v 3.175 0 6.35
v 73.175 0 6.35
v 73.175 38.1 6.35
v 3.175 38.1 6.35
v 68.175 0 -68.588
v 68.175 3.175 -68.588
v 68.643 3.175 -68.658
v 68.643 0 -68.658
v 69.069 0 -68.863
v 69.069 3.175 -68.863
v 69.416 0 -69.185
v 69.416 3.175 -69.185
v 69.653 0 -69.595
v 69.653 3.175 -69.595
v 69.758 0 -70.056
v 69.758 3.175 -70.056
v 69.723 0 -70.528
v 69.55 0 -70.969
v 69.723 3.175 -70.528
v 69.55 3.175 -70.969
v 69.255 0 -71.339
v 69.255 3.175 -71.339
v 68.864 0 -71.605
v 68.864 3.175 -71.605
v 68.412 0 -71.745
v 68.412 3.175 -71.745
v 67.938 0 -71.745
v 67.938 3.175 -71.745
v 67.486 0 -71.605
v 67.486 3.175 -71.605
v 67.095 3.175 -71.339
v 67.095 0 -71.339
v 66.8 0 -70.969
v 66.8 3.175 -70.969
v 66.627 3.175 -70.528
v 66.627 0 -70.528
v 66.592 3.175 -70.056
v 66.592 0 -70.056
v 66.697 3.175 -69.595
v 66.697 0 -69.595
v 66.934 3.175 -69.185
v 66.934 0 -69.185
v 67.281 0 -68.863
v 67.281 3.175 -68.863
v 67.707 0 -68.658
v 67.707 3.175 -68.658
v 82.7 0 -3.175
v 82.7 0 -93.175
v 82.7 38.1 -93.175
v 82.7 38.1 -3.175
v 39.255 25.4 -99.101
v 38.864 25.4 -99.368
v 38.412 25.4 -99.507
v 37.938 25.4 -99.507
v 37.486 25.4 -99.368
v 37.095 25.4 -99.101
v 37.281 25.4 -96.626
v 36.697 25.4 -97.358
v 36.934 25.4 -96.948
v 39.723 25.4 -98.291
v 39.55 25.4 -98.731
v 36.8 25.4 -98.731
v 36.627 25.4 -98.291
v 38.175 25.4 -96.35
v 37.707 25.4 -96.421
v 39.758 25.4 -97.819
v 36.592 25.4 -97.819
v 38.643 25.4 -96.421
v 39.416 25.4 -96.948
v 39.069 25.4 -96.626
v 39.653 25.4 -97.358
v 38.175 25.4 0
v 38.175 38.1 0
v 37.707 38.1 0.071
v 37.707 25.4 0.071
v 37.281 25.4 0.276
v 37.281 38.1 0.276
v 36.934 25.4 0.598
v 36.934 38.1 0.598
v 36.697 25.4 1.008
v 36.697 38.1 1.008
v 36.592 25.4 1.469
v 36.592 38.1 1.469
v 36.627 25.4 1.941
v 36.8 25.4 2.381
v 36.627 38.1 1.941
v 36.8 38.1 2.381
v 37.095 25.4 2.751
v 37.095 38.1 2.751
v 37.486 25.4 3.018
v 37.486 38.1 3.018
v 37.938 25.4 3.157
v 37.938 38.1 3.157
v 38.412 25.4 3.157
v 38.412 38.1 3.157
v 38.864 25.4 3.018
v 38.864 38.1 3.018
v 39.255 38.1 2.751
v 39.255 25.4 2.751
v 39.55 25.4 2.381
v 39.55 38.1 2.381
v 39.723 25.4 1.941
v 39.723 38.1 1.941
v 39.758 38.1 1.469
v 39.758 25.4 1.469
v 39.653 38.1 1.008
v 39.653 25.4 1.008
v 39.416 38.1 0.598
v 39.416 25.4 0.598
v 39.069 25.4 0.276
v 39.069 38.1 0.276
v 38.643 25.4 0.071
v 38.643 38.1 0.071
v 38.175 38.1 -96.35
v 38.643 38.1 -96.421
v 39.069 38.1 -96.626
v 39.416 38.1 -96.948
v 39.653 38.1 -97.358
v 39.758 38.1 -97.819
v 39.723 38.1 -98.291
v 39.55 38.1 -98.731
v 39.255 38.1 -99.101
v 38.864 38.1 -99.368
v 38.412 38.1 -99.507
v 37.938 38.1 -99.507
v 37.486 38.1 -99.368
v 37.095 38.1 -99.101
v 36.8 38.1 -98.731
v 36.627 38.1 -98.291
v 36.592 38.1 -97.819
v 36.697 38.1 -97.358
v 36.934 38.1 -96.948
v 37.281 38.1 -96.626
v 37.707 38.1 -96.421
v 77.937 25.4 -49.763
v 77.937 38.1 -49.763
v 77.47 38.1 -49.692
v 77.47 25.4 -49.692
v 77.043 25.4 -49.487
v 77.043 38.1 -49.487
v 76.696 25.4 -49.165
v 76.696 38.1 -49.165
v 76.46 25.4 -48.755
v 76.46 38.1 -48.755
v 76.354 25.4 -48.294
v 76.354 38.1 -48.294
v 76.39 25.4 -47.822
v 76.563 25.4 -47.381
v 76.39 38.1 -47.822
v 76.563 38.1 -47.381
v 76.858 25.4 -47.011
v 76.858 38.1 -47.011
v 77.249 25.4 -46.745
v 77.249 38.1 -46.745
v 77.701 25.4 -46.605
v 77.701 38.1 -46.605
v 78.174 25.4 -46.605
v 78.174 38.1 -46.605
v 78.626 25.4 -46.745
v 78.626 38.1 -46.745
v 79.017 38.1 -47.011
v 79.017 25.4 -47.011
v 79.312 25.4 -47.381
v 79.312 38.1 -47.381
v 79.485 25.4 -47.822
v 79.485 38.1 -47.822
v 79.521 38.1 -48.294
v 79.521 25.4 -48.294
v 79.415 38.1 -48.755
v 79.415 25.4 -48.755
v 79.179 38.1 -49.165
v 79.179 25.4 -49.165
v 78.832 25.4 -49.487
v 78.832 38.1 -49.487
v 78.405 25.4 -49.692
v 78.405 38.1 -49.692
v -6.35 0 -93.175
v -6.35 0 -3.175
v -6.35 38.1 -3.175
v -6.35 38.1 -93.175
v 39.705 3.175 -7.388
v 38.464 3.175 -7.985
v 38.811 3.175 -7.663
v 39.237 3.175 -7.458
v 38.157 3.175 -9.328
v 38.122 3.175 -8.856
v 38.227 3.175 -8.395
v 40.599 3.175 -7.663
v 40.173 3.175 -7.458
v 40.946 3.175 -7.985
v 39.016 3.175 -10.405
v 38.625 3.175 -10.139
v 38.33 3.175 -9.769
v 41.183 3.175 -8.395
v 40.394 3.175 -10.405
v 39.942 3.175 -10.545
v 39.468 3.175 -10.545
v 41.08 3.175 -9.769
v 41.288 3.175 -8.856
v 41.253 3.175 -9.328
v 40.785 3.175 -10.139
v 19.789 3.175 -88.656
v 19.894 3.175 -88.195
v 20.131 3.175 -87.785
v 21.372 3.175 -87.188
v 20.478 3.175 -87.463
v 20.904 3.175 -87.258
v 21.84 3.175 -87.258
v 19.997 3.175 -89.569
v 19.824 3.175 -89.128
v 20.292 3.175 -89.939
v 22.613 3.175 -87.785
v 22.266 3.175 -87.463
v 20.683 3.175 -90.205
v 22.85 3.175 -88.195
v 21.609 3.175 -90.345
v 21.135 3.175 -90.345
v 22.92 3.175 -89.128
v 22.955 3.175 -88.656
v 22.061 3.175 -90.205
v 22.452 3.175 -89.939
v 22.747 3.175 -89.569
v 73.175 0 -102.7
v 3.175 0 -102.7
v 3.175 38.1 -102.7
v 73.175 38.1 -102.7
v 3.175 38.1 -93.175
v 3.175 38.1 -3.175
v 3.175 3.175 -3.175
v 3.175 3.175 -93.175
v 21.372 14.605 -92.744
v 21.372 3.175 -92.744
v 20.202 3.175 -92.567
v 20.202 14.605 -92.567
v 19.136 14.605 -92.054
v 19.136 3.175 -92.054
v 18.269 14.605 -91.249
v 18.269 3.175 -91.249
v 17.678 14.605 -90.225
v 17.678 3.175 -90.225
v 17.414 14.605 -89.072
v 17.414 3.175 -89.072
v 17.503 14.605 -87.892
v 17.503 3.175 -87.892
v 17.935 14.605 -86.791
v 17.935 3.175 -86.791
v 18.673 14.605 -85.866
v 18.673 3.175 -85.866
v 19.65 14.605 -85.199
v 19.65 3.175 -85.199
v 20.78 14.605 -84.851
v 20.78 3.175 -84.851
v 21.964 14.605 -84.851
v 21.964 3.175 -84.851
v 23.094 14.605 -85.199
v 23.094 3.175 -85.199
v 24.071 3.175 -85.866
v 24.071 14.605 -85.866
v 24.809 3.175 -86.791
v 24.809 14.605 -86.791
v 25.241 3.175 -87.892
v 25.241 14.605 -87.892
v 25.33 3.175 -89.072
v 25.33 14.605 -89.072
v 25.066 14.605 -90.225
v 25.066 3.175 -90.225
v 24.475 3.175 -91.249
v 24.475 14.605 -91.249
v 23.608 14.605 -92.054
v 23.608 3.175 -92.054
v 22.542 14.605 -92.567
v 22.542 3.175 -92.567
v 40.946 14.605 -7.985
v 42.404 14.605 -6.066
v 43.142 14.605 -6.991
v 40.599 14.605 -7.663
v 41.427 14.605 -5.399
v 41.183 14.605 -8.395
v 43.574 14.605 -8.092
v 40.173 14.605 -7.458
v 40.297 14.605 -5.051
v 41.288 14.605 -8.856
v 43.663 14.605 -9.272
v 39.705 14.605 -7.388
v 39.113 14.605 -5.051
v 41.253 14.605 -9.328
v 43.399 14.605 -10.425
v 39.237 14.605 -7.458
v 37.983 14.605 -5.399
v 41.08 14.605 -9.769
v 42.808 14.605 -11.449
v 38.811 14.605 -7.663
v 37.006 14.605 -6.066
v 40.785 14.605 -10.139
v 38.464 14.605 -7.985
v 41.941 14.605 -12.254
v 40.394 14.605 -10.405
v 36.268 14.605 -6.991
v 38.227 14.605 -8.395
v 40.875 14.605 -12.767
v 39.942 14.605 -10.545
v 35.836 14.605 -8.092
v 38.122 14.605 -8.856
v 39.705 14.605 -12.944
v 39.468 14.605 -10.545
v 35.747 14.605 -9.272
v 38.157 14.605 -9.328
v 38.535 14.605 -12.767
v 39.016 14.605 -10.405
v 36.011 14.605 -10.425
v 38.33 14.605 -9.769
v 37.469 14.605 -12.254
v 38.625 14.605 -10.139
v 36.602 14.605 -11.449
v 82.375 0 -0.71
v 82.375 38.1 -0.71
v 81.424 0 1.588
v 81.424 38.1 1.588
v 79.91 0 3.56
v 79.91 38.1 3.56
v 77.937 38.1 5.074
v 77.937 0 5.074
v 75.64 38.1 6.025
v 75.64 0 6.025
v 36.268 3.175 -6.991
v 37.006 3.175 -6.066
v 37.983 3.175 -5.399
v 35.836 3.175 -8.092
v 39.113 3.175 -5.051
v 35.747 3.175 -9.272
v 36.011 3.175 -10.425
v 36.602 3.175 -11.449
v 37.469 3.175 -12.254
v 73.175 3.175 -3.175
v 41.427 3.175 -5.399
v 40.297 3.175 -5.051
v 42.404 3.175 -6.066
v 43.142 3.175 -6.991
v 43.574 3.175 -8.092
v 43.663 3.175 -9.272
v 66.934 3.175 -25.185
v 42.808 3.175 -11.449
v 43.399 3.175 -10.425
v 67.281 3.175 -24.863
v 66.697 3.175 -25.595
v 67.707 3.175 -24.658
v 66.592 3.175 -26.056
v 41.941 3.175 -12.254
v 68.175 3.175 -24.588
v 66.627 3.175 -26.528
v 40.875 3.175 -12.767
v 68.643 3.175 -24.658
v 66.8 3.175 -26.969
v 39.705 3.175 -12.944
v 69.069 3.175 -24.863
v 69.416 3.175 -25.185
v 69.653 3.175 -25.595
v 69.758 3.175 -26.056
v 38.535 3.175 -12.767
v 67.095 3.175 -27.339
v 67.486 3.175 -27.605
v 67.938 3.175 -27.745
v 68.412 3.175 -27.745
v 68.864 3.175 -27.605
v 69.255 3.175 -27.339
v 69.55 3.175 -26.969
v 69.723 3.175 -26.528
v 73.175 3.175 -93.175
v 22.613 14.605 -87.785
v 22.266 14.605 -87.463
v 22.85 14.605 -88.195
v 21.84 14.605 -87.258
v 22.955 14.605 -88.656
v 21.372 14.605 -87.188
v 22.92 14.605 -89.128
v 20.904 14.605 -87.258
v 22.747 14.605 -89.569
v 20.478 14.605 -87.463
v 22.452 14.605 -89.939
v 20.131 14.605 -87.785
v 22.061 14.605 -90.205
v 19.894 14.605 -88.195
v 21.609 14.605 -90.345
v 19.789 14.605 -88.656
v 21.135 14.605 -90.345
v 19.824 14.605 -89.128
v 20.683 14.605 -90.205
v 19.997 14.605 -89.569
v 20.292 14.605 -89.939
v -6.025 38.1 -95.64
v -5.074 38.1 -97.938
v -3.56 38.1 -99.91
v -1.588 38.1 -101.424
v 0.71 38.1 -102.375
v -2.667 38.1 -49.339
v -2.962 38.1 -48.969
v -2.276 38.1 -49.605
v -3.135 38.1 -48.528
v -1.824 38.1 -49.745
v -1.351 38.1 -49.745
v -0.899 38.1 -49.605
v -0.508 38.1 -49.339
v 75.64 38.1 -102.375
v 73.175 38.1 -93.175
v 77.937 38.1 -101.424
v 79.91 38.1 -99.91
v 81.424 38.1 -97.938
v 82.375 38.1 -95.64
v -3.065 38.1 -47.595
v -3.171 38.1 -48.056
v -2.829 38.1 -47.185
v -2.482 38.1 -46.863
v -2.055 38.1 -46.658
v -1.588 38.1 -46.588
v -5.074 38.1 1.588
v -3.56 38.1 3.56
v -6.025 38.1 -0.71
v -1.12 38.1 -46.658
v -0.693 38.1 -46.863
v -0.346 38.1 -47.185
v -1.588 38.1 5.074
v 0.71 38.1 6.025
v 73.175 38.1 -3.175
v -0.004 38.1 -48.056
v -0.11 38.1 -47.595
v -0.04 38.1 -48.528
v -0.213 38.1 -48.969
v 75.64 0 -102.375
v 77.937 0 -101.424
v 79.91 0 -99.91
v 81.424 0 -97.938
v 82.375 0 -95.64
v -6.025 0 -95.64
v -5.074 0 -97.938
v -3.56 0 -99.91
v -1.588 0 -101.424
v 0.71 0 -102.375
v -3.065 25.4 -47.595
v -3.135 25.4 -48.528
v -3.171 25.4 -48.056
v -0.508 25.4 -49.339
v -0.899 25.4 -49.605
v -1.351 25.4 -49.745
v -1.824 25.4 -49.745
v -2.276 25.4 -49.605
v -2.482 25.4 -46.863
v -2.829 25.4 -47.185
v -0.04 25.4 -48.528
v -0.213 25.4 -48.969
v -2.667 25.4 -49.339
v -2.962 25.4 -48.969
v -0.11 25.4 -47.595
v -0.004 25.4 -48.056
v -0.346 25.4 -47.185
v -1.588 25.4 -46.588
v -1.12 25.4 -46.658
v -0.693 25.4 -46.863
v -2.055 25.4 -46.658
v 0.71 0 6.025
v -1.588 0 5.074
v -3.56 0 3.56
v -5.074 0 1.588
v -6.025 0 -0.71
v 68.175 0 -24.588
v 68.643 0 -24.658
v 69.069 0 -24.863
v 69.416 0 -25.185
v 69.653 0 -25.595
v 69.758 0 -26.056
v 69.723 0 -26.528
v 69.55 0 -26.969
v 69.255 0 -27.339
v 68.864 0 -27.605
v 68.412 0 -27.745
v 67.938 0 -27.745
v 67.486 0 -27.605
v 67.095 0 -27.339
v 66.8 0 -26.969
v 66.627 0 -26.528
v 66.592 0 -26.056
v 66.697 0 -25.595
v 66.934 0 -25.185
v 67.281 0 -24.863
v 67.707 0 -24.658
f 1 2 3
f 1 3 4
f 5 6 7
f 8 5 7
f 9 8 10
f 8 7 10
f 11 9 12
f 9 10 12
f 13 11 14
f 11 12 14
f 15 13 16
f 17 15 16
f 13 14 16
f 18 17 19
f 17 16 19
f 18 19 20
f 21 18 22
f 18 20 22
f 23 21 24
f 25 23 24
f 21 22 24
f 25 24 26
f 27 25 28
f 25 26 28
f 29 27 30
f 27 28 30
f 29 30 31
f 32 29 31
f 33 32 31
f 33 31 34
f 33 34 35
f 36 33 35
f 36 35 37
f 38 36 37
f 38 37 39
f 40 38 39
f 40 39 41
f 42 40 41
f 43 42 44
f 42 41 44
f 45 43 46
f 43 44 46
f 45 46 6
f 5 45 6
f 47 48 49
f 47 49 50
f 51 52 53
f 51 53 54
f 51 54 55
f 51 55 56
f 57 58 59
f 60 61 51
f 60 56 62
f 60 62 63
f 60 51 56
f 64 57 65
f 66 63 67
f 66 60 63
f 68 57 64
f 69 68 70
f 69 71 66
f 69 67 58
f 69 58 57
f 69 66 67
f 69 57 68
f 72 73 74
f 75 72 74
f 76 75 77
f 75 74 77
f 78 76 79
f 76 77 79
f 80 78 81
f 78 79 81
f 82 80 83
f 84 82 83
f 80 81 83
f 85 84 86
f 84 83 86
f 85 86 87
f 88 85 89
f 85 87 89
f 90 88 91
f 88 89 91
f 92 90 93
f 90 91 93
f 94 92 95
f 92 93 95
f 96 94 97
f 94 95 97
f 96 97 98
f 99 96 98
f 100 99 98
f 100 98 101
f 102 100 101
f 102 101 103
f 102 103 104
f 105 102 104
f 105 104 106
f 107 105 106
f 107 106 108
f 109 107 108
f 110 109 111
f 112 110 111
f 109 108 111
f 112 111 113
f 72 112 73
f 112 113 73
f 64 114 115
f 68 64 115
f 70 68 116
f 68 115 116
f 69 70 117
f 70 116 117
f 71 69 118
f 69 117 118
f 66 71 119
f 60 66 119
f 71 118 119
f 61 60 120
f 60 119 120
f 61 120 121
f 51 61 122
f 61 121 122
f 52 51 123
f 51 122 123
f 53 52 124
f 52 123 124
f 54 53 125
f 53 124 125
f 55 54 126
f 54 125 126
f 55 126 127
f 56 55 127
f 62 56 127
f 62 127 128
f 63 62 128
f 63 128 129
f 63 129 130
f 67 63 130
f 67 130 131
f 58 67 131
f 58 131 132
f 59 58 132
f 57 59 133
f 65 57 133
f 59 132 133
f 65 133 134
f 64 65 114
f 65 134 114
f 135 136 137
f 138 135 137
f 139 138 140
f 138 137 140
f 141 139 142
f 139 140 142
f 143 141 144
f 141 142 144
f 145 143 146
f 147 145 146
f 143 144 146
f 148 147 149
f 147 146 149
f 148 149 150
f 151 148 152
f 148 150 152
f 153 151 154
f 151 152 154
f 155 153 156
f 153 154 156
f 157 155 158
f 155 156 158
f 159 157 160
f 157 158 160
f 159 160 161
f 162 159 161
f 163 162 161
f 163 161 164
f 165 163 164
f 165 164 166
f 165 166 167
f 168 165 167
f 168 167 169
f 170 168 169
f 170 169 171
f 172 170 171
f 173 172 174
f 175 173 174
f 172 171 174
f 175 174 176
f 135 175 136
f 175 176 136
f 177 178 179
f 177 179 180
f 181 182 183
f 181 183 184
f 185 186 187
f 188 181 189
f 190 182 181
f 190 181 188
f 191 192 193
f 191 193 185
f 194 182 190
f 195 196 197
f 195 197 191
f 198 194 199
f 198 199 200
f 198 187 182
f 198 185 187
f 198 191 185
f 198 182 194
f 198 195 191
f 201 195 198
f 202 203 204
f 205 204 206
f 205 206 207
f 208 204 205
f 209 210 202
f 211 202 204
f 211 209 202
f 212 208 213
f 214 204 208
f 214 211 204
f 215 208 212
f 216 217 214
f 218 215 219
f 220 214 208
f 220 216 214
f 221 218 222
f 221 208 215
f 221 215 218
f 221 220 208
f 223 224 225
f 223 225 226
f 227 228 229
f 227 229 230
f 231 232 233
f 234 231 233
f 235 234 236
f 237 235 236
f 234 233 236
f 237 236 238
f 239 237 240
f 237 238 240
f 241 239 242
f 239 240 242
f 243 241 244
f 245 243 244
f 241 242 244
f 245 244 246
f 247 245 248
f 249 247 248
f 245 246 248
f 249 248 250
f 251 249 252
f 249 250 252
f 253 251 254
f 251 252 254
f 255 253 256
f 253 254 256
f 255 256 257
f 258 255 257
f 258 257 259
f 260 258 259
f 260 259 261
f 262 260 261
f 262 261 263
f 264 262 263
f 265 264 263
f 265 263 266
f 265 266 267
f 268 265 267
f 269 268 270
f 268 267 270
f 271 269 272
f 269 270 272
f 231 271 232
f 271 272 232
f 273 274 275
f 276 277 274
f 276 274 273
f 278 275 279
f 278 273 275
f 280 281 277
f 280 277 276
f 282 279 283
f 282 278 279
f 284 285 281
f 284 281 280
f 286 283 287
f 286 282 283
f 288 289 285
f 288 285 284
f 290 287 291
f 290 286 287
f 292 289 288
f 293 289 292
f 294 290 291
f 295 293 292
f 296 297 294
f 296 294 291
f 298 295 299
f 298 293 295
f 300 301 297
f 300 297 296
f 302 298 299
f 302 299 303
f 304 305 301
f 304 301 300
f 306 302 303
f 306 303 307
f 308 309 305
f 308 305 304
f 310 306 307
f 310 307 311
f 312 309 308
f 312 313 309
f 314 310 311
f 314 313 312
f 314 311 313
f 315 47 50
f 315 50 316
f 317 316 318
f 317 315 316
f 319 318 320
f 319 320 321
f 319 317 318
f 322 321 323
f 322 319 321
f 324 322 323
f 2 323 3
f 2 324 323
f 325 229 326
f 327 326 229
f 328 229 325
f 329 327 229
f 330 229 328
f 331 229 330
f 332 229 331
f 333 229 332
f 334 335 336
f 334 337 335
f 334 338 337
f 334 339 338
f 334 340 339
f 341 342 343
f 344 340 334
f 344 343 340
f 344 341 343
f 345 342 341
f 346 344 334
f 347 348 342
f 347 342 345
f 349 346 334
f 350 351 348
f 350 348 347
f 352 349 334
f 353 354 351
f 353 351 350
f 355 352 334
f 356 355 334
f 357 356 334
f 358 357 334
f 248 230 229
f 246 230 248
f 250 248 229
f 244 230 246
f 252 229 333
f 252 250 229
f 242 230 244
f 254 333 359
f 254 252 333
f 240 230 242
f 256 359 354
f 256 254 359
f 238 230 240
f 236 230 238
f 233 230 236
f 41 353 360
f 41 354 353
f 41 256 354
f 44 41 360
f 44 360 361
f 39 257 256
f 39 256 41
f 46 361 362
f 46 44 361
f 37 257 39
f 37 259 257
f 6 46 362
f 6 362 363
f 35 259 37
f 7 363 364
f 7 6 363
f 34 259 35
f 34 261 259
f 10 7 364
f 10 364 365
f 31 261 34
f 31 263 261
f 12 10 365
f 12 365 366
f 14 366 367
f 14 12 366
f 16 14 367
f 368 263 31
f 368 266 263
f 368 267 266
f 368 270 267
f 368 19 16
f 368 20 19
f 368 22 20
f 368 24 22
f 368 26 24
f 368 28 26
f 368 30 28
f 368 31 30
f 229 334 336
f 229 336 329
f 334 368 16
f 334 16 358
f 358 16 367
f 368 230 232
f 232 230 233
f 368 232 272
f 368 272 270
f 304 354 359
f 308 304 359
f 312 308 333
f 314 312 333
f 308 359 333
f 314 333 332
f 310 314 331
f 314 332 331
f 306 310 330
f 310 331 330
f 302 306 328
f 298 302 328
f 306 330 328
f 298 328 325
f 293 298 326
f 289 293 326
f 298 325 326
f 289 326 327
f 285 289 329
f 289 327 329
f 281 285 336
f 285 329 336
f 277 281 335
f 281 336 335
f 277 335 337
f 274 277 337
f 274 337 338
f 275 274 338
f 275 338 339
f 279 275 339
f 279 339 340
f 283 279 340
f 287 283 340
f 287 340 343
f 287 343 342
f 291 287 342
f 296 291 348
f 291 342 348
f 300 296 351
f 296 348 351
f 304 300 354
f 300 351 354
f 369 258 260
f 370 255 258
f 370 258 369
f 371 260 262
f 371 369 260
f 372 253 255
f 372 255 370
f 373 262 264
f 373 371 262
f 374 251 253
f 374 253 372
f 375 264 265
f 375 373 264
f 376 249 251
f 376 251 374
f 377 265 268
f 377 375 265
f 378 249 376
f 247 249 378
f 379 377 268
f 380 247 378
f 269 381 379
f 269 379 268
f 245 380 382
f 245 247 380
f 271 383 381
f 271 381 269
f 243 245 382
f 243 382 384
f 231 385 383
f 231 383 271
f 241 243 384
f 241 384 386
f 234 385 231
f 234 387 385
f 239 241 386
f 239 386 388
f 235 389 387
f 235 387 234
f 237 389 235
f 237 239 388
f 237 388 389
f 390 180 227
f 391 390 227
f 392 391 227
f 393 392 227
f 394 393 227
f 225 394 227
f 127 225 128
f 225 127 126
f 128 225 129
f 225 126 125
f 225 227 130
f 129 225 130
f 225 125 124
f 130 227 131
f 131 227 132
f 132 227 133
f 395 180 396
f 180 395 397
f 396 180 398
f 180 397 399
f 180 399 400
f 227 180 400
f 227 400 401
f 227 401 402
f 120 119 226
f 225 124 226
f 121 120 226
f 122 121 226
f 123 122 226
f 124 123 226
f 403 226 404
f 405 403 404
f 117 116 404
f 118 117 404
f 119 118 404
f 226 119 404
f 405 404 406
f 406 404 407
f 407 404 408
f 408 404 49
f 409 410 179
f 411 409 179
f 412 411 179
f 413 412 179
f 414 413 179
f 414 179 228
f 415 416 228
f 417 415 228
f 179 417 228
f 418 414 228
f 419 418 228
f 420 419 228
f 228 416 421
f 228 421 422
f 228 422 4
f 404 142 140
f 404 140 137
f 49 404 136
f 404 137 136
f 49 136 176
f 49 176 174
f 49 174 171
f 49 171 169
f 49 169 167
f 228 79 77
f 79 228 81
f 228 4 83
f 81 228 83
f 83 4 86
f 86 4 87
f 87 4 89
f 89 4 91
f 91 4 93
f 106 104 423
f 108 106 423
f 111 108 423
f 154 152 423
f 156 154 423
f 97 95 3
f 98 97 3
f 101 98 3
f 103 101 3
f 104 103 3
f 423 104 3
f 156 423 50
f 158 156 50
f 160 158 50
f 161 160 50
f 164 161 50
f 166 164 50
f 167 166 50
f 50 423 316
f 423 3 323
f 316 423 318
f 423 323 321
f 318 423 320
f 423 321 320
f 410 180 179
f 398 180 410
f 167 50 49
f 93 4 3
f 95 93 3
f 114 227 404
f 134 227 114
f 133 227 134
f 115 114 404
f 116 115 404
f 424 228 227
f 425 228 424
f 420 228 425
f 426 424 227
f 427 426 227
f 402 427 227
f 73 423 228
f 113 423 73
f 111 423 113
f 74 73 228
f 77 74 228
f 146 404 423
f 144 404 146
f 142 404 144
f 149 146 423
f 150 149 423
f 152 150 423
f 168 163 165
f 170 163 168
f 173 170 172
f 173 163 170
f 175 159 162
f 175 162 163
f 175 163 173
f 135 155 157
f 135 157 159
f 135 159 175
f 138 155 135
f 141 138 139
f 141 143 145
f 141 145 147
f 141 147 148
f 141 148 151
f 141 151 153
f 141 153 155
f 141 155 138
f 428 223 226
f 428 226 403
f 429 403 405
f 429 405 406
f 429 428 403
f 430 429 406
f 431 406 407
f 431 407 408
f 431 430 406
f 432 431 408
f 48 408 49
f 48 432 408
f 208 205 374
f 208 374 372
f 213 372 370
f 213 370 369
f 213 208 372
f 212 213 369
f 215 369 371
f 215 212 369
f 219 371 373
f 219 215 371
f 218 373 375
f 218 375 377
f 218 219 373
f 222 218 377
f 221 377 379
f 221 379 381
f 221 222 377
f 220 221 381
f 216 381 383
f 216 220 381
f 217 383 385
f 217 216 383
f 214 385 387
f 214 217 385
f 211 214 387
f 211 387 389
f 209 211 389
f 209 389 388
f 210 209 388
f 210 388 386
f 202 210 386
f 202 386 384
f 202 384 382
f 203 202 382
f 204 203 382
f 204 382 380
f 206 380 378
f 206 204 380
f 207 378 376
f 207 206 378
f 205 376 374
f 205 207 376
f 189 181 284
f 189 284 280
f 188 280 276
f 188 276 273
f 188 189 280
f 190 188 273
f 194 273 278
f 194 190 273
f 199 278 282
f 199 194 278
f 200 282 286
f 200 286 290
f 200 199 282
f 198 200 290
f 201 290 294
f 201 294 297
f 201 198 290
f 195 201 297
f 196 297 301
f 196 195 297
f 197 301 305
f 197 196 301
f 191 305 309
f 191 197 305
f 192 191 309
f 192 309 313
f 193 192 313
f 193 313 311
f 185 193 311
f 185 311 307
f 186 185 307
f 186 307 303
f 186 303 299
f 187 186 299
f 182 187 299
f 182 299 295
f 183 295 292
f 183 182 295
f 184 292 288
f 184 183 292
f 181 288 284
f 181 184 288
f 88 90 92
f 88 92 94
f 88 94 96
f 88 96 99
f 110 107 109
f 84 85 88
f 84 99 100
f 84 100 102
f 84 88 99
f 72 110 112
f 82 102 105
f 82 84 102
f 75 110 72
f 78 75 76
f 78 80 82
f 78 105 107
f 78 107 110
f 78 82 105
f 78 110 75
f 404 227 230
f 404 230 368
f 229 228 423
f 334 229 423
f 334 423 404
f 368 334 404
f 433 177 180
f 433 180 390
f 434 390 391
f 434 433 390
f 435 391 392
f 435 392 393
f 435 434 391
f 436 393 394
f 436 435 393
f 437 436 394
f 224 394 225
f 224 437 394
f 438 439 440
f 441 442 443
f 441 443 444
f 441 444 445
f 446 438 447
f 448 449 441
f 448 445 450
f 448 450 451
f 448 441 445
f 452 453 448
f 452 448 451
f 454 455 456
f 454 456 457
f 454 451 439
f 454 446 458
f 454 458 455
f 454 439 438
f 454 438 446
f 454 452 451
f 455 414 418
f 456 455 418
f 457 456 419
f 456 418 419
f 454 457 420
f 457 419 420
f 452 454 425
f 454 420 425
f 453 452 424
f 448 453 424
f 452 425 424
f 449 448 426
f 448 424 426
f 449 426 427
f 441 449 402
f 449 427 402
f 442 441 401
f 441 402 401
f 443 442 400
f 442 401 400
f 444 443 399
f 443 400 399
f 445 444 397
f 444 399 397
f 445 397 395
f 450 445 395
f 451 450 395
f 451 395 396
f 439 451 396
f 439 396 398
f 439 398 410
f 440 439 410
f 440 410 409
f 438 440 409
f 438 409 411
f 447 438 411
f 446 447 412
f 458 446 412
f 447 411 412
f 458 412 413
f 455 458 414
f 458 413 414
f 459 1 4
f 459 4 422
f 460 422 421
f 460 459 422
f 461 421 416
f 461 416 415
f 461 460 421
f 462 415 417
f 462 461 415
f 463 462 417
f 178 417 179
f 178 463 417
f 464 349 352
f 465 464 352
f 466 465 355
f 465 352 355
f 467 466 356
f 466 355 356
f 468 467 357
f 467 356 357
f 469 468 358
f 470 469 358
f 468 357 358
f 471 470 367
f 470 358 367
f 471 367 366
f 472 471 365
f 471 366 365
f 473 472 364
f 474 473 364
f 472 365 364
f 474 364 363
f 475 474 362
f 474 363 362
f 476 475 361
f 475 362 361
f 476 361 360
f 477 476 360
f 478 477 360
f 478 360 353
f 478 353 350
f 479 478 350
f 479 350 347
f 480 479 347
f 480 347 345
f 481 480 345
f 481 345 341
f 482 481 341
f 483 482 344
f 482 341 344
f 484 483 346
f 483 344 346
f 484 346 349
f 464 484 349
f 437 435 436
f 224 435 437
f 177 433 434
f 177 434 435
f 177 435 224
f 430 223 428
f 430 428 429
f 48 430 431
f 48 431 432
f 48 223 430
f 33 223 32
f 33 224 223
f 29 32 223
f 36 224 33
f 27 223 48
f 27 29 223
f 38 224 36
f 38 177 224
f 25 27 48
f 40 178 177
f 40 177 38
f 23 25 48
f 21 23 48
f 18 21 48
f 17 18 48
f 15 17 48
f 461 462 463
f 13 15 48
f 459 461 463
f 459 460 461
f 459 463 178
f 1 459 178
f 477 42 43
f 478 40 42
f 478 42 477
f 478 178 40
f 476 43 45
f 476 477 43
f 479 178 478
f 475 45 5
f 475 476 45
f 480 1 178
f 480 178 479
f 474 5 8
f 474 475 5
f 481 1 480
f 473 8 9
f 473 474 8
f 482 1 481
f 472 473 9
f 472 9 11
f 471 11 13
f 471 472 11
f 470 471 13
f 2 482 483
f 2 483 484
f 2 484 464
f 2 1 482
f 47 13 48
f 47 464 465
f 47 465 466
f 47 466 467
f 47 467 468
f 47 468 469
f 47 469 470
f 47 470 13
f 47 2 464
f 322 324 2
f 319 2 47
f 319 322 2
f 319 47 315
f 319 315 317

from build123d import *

# Parameters (mm, degrees)
BOSS_EXTRUDE1_DEPTH = 38.1
SKETCH2_W           = 69.999999954
SKETCH2_H           = 90.000000086
CUT_EXTRUDE1_DEPTH  = 34.925
SKETCH3_R           = 3.96875
SKETCH3_R_2         = 1.5875
BOSS_EXTRUDE2_DEPTH = 11.43
BOSS_EXTRUDE3_DEPTH = 38.1
SKETCH5_R           = 1.5875
CUT_EXTRUDE2_DEPTH  = 12.7
SKETCH7_R           = 1.5875
CUT_EXTRUDE3_DEPTH  = 3.175


with BuildPart() as part:
    # Sketch1 → Boss-Extrude1 (new body)
    with BuildSketch(Plane(origin=(0, 0, 0), x_dir=(1, 0, 0), z_dir=(0, 1, 0))):
        with BuildLine():
            Line((3.175, 0), (73.174999954, 0))
            ThreePointArc((73.174999954, 0), (75.420063984, 0.92993597), (76.349999954, 3.175))
            Line((76.349999954, 3.175), (76.349999954, 93.175000086))
            ThreePointArc((76.349999954, 93.175000086), (75.420063984, 95.420064116), (73.174999954, 96.350000086))
            Line((73.174999954, 96.350000086), (3.175, 96.350000086))
            ThreePointArc((3.175, 96.350000086), (0.92993597, 95.420064116), (0, 93.175000086))
            Line((0, 93.175000086), (0, 3.175))
            ThreePointArc((0, 3.175), (0.92993597, 0.92993597), (3.175, 0))
        make_face()
    extrude(amount=BOSS_EXTRUDE1_DEPTH)

    # Sketch2 → Cut-Extrude1 (cut)
    with BuildSketch(Plane(origin=(0, 38.1, 0), x_dir=(1, 0, 0), z_dir=(0, 1, 0))):
        with Locations((38.174999977, 48.175000043)):
            Rectangle(SKETCH2_W, SKETCH2_H)
    extrude(amount=-CUT_EXTRUDE1_DEPTH, mode=Mode.SUBTRACT)

    # Sketch3 → Boss-Extrude2 (add)
    # profile 1 of 2: a face of its own
    with BuildSketch(Plane(origin=(0, 3.175, 0), x_dir=(1, 0, 0), z_dir=(0, 1, 0))):
        with Locations(Location((21.371999977, 88.775000043, 0), (0, 0, 90))):
            Circle(SKETCH3_R)
        with Locations(Location((21.371999977, 88.775000043, 0), (0, 0, 270))):
            Circle(SKETCH3_R_2, mode=Mode.SUBTRACT)
    # profile 2 of 2: a face of its own
    with BuildSketch(Plane(origin=(0, 3.175, 0), x_dir=(1, 0, 0), z_dir=(0, 1, 0))):
        with Locations(Location((39.704999977, 8.975000043, 0), (0, 0, 90))):
            Circle(SKETCH3_R)
        with Locations(Location((39.704999977, 8.975000043, 0), (0, 0, 270))):
            Circle(SKETCH3_R_2, mode=Mode.SUBTRACT)
    extrude(amount=BOSS_EXTRUDE2_DEPTH)

    # Sketch4 → Boss-Extrude3 (add)
    with BuildSketch(Plane.XZ):
        with BuildLine():
            Line((-6.35, -3.175), (-6.35, -93.175000086))
            ThreePointArc((-6.35, -93.175000086), (-3.560192091, -99.910192177), (3.175, -102.700000086))
            Line((3.175, -102.700000086), (73.174999954, -102.700000086))
            ThreePointArc((73.174999954, -102.700000086), (79.910192045, -99.910192177), (82.699999954, -93.175000086))
            Line((82.699999954, -93.175000086), (82.699999954, -3.175))
            ThreePointArc((82.699999954, -3.175), (79.910192045, 3.560192091), (73.174999954, 6.35))
            Line((73.174999954, 6.35), (3.175, 6.35))
            ThreePointArc((3.175, 6.35), (-3.560192091, 3.560192091), (-6.35, -3.175))
        make_face()
        with BuildLine():
            Line((0, -3.175), (0, -93.175000086))
            ThreePointArc((0, -93.175000086), (0.92993597, -95.420064116), (3.175, -96.350000086))
            Line((3.175, -96.350000086), (73.174999954, -96.350000086))
            ThreePointArc((73.174999954, -96.350000086), (75.420063984, -95.420064116), (76.349999954, -93.175000086))
            Line((76.349999954, -93.175000086), (76.349999954, -3.175))
            ThreePointArc((76.349999954, -3.175), (75.420063984, -0.92993597), (73.174999954, 0))
            Line((73.174999954, 0), (3.175, 0))
            ThreePointArc((3.175, 0), (0.92993597, -0.92993597), (0, -3.175))
        make_face(mode=Mode.SUBTRACT)
    extrude(amount=-BOSS_EXTRUDE3_DEPTH)

    # Sketch5 → Cut-Extrude2 (cut)
    with BuildSketch(Plane(origin=(0, 38.1, 0), x_dir=(1, 0, 0), z_dir=(0, 1, 0))):
        with Locations(Location((-1.5875, 48.175000043, 0), (0, 0, 270))):
            Circle(SKETCH5_R)
        with Locations(Location((38.174999977, 97.937500086, 0), (0, 0, 270))):
            Circle(SKETCH5_R)
        with Locations(Location((38.174999977, -1.5875, 0), (0, 0, 90))):
            Circle(SKETCH5_R)
        with Locations(Location((77.937499954, 48.175000043, 0), (0, 0, 90))):
            Circle(SKETCH5_R)
    extrude(amount=-CUT_EXTRUDE2_DEPTH, mode=Mode.SUBTRACT)

    # Sketch7 → Cut-Extrude3 (cut)
    with BuildSketch(Plane(origin=(0, 3.175, 0), x_dir=(1, 0, 0), z_dir=(0, 1, 0))):
        with Locations(Location((68.174999954, 70.175000043, 0), (0, 0, 270))):
            Circle(SKETCH7_R)
        with Locations(Location((68.174999954, 26.175000043, 0), (0, 0, 270))):
            Circle(SKETCH7_R)
    extrude(amount=-CUT_EXTRUDE3_DEPTH, mode=Mode.SUBTRACT)


solid = part.part
